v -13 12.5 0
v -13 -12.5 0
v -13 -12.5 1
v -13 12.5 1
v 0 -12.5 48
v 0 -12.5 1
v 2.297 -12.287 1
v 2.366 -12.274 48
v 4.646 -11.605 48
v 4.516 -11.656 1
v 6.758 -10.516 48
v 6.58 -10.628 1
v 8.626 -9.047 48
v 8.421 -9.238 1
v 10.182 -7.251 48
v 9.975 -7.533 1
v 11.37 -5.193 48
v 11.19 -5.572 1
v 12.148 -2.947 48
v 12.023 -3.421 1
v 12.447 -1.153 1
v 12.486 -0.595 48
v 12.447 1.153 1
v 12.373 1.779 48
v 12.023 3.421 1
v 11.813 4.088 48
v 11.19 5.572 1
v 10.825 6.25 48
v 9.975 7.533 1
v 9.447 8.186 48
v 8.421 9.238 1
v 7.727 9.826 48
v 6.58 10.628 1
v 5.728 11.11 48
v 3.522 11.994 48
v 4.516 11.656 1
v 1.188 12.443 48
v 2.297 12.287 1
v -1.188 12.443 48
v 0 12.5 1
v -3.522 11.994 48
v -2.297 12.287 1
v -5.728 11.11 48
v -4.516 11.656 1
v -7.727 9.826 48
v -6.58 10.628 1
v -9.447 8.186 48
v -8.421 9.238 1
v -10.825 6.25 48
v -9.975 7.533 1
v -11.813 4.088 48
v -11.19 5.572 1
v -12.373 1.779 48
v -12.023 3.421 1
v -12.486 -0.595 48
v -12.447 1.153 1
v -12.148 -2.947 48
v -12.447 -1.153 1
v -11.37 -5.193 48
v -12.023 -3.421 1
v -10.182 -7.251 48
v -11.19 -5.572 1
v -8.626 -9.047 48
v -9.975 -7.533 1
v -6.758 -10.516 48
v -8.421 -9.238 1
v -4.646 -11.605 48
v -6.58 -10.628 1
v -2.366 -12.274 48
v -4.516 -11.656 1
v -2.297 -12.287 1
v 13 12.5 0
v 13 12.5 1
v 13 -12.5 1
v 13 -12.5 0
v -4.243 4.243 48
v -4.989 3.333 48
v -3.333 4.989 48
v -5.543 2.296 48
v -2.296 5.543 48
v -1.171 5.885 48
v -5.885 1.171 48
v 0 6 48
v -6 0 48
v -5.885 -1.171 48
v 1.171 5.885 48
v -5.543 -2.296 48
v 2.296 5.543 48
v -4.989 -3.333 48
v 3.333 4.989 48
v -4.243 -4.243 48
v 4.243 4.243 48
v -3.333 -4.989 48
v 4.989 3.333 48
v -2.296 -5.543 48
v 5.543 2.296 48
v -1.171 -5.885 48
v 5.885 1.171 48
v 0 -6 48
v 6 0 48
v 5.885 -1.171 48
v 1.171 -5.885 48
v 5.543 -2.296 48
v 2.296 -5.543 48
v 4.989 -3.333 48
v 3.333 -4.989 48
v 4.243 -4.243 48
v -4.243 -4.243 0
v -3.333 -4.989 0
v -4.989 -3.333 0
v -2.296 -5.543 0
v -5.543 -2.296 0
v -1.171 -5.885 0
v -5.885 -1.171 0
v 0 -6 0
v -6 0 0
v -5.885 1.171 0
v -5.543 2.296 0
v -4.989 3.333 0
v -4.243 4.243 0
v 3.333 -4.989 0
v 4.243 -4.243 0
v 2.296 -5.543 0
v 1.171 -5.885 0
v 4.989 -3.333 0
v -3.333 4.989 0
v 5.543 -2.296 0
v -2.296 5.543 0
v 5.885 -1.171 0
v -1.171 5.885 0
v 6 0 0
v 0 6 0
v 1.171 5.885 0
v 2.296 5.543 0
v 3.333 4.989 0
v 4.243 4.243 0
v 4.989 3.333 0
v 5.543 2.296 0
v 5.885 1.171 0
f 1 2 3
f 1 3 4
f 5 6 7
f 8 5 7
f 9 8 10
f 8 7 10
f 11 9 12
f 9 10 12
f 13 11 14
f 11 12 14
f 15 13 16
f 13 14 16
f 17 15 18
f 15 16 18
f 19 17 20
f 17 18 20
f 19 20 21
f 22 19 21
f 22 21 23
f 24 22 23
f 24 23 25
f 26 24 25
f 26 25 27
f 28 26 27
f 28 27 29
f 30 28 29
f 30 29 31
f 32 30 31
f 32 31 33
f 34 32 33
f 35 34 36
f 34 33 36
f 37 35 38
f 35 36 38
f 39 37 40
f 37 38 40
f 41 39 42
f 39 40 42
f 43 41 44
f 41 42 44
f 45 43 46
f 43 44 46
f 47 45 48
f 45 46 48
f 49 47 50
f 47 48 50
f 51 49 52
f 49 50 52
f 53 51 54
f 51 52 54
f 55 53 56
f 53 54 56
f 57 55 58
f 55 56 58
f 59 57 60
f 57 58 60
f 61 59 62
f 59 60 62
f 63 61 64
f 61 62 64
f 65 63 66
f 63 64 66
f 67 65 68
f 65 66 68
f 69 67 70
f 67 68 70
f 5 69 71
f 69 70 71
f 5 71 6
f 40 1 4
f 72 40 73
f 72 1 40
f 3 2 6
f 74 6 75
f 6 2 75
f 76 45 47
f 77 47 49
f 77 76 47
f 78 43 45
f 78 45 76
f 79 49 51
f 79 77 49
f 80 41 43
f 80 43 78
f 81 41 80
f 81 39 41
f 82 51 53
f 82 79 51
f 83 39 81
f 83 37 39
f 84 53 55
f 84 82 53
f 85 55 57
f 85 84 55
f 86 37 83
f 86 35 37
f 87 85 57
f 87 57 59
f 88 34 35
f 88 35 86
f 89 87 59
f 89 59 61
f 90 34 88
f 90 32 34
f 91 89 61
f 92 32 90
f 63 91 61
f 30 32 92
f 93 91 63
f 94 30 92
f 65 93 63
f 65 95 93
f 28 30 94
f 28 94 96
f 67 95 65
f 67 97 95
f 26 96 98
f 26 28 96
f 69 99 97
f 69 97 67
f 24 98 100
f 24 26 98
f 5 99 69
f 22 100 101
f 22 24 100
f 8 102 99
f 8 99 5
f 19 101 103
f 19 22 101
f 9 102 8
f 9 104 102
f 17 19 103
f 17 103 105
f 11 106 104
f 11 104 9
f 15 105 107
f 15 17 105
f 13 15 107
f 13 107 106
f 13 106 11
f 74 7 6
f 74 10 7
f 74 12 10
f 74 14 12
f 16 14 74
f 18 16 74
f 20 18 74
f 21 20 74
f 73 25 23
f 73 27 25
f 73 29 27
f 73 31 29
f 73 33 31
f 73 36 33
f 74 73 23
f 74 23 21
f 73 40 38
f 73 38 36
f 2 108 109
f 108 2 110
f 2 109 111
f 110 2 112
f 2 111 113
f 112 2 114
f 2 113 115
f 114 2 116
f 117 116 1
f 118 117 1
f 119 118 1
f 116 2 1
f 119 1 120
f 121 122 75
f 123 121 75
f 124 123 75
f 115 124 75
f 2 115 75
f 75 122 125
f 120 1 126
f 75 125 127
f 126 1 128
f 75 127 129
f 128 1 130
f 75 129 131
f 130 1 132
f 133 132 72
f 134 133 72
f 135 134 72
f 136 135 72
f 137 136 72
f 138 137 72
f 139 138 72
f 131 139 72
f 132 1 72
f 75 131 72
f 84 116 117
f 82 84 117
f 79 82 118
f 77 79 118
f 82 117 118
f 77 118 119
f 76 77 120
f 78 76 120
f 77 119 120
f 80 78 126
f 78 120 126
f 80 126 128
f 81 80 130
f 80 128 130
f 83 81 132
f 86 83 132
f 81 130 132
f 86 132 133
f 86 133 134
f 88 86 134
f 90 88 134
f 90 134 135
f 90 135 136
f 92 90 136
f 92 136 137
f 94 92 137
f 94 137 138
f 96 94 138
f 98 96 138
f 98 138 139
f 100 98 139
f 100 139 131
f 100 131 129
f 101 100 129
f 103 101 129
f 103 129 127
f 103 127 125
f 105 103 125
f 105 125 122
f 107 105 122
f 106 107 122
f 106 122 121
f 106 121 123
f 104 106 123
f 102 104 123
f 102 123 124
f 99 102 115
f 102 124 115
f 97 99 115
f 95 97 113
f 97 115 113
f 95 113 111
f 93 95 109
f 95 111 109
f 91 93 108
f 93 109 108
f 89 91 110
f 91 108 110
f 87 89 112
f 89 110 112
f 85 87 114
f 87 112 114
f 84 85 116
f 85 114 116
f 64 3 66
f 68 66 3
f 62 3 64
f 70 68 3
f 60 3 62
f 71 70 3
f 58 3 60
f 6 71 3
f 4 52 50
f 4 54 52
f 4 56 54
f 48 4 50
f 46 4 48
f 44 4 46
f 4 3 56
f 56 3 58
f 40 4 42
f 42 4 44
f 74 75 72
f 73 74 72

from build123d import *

# Parameters (mm, degrees)
SKETCH1_W           = 26
SKETCH1_H           = 25
BOSS_EXTRUDE1_DEPTH = 1
SKETCH2_R           = 12.5
BOSS_EXTRUDE2_DEPTH = 47
SKETCH3_R           = 6
CUT_EXTRUDE1_DEPTH  = 52.276212809


with BuildPart() as part:
    # Sketch1 → Boss-Extrude1 (new body)
    with BuildSketch(Plane.XY):
        Rectangle(SKETCH1_W, SKETCH1_H)
    extrude(amount=BOSS_EXTRUDE1_DEPTH)

    # Sketch2 → Boss-Extrude2 (add)
    with BuildSketch(Plane.XY.offset(1)):
        with Locations(Location((0, 0, 0), (0, 0, 270))):
            Circle(SKETCH2_R)
    extrude(amount=BOSS_EXTRUDE2_DEPTH)

    # Sketch3 → Cut-Extrude1 (cut, through all)
    with BuildSketch(Plane(origin=(0, 0, 0), x_dir=(-1, 0, 0), z_dir=(0, 0, -1))):
        Circle(SKETCH3_R)
    extrude(amount=-CUT_EXTRUDE1_DEPTH, mode=Mode.SUBTRACT)


solid = part.part
